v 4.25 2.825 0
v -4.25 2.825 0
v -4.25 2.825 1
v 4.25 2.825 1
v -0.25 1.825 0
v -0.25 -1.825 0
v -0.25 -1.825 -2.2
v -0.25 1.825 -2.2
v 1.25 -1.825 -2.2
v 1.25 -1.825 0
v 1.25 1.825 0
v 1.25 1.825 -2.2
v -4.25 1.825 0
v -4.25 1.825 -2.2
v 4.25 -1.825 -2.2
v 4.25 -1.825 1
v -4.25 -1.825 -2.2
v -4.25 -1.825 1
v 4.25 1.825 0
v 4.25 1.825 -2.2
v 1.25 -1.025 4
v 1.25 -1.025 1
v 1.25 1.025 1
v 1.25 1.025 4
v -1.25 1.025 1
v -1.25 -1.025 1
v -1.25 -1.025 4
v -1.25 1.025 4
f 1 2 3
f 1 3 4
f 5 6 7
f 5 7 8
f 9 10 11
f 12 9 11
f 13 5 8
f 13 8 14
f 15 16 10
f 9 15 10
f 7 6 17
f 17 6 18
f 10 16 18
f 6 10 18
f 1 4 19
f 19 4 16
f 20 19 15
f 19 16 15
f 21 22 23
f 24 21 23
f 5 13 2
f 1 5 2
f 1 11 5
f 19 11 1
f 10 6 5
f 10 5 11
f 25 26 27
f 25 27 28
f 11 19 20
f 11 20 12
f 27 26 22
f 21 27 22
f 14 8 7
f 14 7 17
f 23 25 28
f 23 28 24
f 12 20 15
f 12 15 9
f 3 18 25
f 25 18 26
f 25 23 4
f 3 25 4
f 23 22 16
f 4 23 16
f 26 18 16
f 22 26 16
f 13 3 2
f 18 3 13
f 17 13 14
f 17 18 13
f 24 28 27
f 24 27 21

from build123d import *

# Parameters (mm, degrees)
SKETCH1_W           = 8.5
SKETCH1_H           = 3.65
BOSS_EXTRUDE1_DEPTH = 1
SKETCH2_W           = 2.5
SKETCH2_H           = 2.05
BOSS_EXTRUDE2_DEPTH = 3
SKETCH3_W           = 4
SKETCH3_H           = 3.65
SKETCH3_W_2         = 3
BOSS_EXTRUDE3_DEPTH = 2.2
SKETCH4_W           = 8.5
SKETCH4_H           = 1
BOSS_EXTRUDE4_DEPTH = 1


with BuildPart() as part:
    # Sketch1 → Boss-Extrude1 (new body)
    with BuildSketch(Plane.XY):
        Rectangle(SKETCH1_W, SKETCH1_H)
    extrude(amount=BOSS_EXTRUDE1_DEPTH)

    # Sketch2 → Boss-Extrude2 (add)
    with BuildSketch(Plane.XY.offset(1)):
        Rectangle(SKETCH2_W, SKETCH2_H)
    extrude(amount=BOSS_EXTRUDE2_DEPTH)

    # Sketch3 → Boss-Extrude3 (add)
    with BuildSketch(Plane(origin=(0, 0, 0), x_dir=(-1, 0, 0), z_dir=(0, 0, -1))):
        with Locations((2.25, 0)):
            Rectangle(SKETCH3_W, SKETCH3_H)
        with Locations((-2.75, 0)):
            Rectangle(SKETCH3_W_2, SKETCH3_H)
    extrude(amount=BOSS_EXTRUDE3_DEPTH)

    # Sketch4 → Boss-Extrude4 (add)
    with BuildSketch(Plane(origin=(0, 1.825, 0), x_dir=(1, 0, 0), z_dir=(0, 1, 0))):
        with Locations((0, -0.5)):
            Rectangle(SKETCH4_W, SKETCH4_H)
    extrude(amount=BOSS_EXTRUDE4_DEPTH)


solid = part.part
